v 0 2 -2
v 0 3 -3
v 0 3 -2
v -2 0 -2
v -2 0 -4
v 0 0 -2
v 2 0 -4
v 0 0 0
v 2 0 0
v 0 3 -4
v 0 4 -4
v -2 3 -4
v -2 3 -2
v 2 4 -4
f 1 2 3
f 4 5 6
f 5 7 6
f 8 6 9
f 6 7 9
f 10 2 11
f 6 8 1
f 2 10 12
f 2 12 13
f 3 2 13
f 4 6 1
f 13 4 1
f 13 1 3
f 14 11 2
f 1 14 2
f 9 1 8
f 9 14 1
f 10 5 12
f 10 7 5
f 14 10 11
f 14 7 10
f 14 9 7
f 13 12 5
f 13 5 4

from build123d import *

# Parameters (mm, degrees)
SKETCH1_W           = 4
SKETCH1_H           = 4
BOSS_EXTRUDE1_DEPTH = 2
SKETCH2_W           = 2
SKETCH2_H           = 3
BOSS_EXTRUDE2_DEPTH = 2
CUT_EXTRUDE1_DEPTH  = 2


with BuildPart() as part:
    # Sketch1 → Boss-Extrude1 (new body)
    with BuildSketch(Plane(origin=(0, 0, 0), x_dir=(0, 0, -1), z_dir=(1, 0, 0))):
        with Locations((2, 2)):
            Rectangle(SKETCH1_W, SKETCH1_H)
    extrude(amount=BOSS_EXTRUDE1_DEPTH)

    # Sketch2 → Boss-Extrude2 (add)
    with BuildSketch(Plane.ZY):
        with Locations((-3, 1.5)):
            Rectangle(SKETCH2_W, SKETCH2_H)
    extrude(amount=BOSS_EXTRUDE2_DEPTH)

    # Sketch3 → Cut-Extrude1 (cut)
    with BuildSketch(Plane(origin=(2, 0, 0), x_dir=(0, 0, -1), z_dir=(1, 0, 0))):
        Polygon((4, 4), (0, 0), (0, 4), align=None)
    extrude(amount=-CUT_EXTRUDE1_DEPTH, mode=Mode.SUBTRACT)


solid = part.part
